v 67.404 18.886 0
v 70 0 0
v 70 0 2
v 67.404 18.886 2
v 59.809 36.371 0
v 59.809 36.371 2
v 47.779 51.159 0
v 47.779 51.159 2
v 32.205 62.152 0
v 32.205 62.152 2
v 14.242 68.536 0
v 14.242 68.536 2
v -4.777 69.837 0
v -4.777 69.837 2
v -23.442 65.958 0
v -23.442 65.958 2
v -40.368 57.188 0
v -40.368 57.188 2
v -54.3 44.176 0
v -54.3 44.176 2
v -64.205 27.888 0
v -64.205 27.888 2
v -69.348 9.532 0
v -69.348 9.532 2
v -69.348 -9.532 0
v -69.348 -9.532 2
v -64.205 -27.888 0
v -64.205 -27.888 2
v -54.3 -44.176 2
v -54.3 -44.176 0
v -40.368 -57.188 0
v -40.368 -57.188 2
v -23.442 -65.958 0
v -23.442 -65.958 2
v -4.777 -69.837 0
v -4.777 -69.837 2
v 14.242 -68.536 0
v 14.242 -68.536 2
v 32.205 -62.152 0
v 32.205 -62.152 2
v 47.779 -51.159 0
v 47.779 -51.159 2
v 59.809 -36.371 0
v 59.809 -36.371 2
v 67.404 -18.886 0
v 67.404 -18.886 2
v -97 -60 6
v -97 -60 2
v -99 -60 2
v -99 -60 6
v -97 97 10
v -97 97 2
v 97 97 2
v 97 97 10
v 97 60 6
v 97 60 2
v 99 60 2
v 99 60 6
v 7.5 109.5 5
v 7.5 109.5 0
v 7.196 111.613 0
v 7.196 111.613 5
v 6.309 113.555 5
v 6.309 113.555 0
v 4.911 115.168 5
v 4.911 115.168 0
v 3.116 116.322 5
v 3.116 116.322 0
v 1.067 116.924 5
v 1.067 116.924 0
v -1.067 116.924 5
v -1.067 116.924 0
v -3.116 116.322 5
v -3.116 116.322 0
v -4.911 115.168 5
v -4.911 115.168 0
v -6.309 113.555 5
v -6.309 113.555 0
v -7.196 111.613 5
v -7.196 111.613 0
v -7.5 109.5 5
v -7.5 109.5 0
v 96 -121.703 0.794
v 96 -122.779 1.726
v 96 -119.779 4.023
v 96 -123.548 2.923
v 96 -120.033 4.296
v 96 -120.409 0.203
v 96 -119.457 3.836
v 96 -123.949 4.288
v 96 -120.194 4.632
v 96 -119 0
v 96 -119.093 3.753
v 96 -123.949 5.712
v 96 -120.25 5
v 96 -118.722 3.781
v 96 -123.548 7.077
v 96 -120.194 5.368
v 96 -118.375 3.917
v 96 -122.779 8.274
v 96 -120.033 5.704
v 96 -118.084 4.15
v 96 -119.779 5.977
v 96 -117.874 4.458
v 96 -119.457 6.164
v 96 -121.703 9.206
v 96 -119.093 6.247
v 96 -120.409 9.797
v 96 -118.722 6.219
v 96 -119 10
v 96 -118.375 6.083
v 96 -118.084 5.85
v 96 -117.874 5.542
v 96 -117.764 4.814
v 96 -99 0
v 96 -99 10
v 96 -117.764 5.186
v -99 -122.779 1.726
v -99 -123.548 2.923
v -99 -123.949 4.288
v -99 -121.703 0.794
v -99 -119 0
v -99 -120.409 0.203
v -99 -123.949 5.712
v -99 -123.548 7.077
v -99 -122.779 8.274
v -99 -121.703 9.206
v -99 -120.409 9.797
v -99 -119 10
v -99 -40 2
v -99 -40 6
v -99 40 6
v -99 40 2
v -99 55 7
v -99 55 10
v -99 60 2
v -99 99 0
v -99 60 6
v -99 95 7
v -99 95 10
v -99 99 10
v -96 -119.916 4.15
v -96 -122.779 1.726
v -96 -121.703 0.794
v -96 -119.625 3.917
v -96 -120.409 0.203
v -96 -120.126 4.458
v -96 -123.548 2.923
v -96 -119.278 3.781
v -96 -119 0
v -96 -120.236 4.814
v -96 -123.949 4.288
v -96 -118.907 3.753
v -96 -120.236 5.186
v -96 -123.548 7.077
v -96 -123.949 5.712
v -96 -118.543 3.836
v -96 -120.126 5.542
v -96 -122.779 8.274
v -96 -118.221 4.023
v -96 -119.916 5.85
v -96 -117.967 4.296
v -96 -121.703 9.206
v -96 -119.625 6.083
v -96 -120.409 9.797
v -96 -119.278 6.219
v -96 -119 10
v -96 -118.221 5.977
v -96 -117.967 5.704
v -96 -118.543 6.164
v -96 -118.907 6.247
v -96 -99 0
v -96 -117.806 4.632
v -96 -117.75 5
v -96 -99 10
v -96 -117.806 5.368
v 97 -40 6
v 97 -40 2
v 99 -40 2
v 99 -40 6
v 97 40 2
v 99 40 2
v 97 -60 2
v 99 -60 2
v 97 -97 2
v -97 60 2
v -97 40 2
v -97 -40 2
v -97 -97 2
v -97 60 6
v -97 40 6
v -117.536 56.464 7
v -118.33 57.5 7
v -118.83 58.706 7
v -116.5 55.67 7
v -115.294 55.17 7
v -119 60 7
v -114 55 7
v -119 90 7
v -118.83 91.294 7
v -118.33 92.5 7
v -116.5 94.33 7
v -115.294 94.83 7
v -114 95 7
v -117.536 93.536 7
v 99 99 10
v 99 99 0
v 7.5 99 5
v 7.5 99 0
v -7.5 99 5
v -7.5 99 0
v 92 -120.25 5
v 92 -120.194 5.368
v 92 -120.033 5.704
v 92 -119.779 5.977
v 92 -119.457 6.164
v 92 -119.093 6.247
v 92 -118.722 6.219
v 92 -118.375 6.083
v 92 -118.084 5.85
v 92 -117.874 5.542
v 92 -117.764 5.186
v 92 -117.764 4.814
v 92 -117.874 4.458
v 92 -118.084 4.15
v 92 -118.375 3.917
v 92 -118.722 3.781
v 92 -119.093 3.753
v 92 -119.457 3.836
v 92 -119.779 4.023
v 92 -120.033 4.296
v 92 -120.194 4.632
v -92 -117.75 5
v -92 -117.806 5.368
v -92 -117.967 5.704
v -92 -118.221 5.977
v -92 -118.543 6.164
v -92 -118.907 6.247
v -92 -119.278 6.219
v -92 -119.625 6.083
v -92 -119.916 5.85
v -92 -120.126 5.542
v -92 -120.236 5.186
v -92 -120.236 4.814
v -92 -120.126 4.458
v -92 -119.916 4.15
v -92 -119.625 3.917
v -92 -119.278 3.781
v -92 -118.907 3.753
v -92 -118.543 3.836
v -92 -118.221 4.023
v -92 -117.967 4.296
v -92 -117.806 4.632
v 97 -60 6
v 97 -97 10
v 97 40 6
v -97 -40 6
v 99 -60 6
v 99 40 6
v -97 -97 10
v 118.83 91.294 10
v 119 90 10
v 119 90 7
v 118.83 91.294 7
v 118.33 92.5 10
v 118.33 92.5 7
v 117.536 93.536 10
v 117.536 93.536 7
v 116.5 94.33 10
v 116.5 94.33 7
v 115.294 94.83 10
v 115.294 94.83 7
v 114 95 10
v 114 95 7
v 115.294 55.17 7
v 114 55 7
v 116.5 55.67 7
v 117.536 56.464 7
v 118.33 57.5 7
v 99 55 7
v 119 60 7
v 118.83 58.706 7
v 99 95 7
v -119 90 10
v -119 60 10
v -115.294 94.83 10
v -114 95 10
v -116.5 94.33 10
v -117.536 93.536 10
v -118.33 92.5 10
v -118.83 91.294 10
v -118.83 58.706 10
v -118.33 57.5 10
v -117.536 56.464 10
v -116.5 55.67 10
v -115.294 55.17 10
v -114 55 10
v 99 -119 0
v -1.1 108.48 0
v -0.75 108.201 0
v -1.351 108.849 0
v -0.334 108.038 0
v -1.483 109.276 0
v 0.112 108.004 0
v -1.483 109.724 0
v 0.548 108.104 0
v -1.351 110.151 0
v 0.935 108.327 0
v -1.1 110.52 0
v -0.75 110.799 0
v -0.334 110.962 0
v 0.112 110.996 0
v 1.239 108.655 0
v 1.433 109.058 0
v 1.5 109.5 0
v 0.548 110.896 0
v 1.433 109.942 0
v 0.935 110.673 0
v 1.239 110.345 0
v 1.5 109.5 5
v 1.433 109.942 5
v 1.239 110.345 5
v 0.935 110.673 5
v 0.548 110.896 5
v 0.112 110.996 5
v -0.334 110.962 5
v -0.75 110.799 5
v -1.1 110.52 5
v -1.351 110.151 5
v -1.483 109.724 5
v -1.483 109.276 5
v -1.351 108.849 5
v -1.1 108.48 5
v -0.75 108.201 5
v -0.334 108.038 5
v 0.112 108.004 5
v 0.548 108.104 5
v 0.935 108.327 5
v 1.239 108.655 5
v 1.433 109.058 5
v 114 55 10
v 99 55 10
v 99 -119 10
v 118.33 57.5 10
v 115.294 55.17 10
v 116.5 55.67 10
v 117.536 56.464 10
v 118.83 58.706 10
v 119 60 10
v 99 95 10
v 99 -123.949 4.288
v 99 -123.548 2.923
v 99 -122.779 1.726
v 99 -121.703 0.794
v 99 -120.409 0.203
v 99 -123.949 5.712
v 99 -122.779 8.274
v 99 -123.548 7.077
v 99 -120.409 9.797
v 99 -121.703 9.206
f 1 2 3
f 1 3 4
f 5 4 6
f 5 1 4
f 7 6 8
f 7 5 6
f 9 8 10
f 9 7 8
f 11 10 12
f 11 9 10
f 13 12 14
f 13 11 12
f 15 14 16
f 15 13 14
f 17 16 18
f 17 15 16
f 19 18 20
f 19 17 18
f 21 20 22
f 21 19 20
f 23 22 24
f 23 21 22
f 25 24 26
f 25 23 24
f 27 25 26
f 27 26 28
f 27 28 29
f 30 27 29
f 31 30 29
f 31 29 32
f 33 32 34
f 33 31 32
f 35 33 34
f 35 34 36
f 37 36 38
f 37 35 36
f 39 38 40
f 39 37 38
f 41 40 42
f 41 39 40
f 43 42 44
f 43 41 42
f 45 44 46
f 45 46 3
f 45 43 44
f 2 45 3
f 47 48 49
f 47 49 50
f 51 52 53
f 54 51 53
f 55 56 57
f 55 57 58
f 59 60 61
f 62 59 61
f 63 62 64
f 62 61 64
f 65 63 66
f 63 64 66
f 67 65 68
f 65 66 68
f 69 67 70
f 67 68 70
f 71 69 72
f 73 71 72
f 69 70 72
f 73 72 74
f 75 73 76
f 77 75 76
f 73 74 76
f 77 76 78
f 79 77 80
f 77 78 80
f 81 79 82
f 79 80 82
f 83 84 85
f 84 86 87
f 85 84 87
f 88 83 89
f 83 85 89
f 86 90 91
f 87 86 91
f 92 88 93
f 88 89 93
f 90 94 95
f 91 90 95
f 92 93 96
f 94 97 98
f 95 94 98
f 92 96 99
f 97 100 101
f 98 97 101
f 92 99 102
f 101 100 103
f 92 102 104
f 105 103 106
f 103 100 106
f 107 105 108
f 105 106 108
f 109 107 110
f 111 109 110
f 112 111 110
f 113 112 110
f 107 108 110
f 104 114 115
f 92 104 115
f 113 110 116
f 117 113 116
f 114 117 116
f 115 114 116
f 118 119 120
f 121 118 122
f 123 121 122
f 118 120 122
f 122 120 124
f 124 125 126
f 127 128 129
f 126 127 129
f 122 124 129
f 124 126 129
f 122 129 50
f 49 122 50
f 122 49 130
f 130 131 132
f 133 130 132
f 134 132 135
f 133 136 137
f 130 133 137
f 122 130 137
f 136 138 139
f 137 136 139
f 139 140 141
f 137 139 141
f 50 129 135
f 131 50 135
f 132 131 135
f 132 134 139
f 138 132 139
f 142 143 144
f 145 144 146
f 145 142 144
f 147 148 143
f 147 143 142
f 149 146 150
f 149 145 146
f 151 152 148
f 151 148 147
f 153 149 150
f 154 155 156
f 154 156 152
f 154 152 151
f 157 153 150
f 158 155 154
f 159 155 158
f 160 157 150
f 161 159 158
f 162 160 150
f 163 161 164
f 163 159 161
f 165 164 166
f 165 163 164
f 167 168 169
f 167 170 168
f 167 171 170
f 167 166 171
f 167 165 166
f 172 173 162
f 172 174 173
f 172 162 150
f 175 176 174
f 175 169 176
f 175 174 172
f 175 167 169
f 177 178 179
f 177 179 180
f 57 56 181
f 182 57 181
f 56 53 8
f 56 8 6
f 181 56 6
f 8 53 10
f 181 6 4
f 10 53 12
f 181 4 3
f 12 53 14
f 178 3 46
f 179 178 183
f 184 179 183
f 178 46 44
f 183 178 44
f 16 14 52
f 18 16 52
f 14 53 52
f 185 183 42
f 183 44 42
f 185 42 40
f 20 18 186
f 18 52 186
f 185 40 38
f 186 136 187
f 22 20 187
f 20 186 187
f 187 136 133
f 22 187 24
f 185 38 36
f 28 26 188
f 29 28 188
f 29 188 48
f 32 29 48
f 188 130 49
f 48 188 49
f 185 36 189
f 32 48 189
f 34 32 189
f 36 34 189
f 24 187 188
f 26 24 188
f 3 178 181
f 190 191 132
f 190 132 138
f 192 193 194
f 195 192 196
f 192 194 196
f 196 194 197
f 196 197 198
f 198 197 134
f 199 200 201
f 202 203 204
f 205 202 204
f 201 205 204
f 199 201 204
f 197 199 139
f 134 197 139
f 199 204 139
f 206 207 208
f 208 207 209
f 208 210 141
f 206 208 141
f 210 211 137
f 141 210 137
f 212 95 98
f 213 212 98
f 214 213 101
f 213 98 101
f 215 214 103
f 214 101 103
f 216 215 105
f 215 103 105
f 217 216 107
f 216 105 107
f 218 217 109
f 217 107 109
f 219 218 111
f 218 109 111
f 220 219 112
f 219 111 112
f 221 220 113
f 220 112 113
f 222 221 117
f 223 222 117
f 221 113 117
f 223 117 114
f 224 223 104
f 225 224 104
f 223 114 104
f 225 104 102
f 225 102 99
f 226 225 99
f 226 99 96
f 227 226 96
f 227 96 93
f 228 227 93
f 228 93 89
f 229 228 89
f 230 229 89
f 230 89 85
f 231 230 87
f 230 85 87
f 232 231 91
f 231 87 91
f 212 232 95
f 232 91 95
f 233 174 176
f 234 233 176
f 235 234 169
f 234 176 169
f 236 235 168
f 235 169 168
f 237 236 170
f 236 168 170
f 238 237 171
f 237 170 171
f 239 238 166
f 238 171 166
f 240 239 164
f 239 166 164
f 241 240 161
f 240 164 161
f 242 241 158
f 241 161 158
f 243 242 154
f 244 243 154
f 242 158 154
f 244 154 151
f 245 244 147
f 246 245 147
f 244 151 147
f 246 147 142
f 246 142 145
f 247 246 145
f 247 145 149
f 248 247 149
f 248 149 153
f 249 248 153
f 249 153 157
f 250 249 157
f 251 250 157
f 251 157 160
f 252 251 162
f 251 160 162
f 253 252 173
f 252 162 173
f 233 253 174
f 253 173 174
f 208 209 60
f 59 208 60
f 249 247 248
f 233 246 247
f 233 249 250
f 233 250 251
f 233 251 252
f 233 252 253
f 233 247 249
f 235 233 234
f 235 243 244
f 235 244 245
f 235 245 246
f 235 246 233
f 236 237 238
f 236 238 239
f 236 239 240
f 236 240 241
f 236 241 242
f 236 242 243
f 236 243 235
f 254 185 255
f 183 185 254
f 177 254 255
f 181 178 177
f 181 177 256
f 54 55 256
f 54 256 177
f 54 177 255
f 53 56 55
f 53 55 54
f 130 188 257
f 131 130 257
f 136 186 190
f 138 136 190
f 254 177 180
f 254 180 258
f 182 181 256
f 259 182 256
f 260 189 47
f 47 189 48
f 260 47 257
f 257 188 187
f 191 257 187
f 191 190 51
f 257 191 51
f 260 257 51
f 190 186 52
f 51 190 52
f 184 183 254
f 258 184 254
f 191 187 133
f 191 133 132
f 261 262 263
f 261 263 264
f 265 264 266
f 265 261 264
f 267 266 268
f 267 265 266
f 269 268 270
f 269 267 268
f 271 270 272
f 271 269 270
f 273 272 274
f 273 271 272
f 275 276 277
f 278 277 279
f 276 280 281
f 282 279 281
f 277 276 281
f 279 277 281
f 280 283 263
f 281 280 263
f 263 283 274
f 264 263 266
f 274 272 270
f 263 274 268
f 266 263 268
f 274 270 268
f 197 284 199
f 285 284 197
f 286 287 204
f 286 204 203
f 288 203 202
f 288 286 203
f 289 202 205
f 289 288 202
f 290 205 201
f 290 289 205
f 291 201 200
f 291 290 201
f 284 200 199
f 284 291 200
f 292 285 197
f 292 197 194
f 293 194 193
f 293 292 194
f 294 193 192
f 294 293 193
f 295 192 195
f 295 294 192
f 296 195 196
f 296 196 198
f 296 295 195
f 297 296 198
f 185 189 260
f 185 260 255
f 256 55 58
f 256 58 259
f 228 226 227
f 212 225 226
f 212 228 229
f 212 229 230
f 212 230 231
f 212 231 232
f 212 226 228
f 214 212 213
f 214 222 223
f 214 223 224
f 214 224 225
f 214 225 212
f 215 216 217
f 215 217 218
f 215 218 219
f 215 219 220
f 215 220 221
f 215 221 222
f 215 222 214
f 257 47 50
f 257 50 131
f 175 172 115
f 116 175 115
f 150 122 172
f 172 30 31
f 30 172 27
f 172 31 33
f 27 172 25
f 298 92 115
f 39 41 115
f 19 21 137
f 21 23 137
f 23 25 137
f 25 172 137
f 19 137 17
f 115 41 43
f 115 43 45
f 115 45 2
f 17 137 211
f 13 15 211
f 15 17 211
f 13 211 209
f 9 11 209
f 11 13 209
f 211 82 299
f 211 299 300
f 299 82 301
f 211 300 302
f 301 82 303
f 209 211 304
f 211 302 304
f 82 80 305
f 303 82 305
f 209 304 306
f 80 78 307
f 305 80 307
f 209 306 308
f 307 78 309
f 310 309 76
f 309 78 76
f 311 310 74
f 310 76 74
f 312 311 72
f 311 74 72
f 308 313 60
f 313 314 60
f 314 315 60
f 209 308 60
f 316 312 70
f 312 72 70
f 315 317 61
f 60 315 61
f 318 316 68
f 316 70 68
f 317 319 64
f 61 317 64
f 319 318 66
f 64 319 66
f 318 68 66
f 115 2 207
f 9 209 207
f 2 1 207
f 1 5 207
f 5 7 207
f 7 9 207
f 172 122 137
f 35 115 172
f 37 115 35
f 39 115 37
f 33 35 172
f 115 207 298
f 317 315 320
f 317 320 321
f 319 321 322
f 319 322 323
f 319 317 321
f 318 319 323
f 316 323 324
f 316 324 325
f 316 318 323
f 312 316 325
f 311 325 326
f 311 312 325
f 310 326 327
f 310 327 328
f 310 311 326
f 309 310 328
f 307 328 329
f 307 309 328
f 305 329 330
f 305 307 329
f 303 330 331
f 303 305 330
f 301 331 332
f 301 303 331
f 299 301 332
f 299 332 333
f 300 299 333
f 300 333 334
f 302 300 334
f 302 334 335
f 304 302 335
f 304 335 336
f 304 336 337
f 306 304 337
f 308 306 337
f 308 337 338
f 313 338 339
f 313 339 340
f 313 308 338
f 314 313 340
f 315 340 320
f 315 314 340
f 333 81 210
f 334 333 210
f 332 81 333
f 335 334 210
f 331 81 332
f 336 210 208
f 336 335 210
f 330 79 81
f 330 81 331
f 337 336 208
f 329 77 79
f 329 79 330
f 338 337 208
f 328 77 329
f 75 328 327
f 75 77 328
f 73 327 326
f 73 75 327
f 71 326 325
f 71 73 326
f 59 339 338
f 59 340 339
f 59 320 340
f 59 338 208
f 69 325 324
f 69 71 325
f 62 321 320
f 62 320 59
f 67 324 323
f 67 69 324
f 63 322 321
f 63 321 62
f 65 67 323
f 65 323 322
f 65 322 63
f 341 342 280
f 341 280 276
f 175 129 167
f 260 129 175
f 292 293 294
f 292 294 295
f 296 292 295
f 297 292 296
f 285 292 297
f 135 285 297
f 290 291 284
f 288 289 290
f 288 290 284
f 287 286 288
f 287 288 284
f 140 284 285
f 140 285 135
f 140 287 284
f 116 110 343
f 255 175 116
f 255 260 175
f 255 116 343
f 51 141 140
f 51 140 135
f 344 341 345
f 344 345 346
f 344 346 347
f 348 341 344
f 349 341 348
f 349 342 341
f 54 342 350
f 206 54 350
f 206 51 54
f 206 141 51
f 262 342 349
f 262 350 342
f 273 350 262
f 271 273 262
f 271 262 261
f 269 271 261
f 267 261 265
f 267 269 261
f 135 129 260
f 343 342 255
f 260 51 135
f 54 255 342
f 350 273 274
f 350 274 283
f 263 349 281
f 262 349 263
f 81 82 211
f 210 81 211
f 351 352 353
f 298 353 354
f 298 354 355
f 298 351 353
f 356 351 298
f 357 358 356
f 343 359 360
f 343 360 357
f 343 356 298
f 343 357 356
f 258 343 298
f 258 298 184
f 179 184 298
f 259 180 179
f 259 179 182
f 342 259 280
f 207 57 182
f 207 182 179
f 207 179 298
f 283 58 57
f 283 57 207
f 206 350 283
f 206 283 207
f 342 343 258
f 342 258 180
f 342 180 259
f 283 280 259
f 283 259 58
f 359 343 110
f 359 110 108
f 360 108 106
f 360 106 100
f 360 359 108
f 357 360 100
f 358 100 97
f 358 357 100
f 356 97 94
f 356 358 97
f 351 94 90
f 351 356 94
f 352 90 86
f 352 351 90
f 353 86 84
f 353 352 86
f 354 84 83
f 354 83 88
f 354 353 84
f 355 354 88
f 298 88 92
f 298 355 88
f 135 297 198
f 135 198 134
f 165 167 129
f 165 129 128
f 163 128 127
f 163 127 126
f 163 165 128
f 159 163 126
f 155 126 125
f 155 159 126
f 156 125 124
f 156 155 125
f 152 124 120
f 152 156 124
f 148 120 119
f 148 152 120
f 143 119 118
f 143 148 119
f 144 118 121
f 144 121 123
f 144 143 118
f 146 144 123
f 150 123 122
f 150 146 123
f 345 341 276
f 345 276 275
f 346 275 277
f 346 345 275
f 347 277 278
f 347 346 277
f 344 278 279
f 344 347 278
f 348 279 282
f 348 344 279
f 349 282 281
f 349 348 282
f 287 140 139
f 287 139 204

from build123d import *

# Parameters (mm, degrees)
F0_W      = 194
F0_H      = 194
F0_R      = 70
F1_DEPTH  = 2
F0_R_2    = 1.5
F2_DEPTH  = 5
F0_W_2    = 3
F0_H_2    = 20
F3_DEPTH  = 10
F5_DEPTH  = 3
F7_DEPTH  = 3
F8_R      = 1.25
F9_DEPTH  = 4
F11_R     = 1.25
F12_DEPTH = 4
F14_DEPTH = 3
F15_W     = 20
F15_H     = 4
F16_DEPTH = 2
F17_W     = 20
F17_H     = 4
F18_DEPTH = 2


with BuildPart() as f1:
    # F0 (on Top) → F1 (new body)
    with BuildSketch(Plane.XY):
        Rectangle(F0_W, F0_H)
        Circle(F0_R, mode=Mode.SUBTRACT)
    extrude(amount=F1_DEPTH)



with BuildPart() as f2:
    # F0 (on Top) → F2 (new body)
    with BuildSketch(Plane.XY):
        with BuildLine():
            Line((-7.5, 99), (7.5, 99))
            Line((7.5, 99), (7.5, 109.5))
            ThreePointArc((7.5, 109.5), (0, 117), (-7.5, 109.5))
            Line((-7.5, 109.5), (-7.5, 99))
        make_face()
        with Locations((0, 109.5)):
            Circle(F0_R_2, mode=Mode.SUBTRACT)
    extrude(amount=F2_DEPTH)


with BuildPart() as f1_1:
    add(f1.part)

    add(f2.part)  # F3 merges F2
    # F0 (on Top) → F3 (join)
    with BuildSketch(Plane.XY):
        Polygon((96, -99), (99, -99), (99, 99), (7.5, 99), (-7.5, 99), (-99, 99), (-99, -99), (-96, -99), align=None)
        Rectangle(F0_W, F0_H, mode=Mode.SUBTRACT)
        with Locations((-97.5, -109)):
            Rectangle(F0_W_2, F0_H_2)
        with Locations((97.5, -109)):
            Rectangle(F0_W_2, F0_H_2)
    extrude(amount=F3_DEPTH)

    # F4 (on face) → F5 (join)
    with BuildSketch(Plane.YZ.offset(-96)):
        with BuildLine():
            Line((-119, 0), (-119, 10))
            ThreePointArc((-119, 10), (-124, 5), (-119, 0))
        make_face()
    extrude(amount=-F5_DEPTH)

    # F6 (on face) → F7 (join)
    with BuildSketch(Plane.YZ.offset(99)):
        with BuildLine():
            Line((-119, 0), (-119, 10))
            ThreePointArc((-119, 10), (-124, 5), (-119, 0))
        make_face()
    extrude(amount=-F7_DEPTH)

    # F8 (on face) → F9 (join)
    with BuildSketch(Plane.YZ.offset(-96)):
        with Locations((-119, 5)):
            Circle(F8_R)
    extrude(amount=F9_DEPTH)

    # F11 (on offset) → F12 (join)
    with BuildSketch(Plane(origin=(96, 0, 0), x_dir=(0, -1, 0), z_dir=(-1, 0, 0))):
        with Locations((119, 5)):
            Circle(F11_R)
    extrude(amount=F12_DEPTH)

    # F13 (on face) → F14 (join)
    with BuildSketch(Plane.XY.offset(10)):
        with BuildLine():
            Line((-99, 55), (-99, 95))
            Line((-99, 95), (-114, 95))
            ThreePointArc((-114, 95), (-117.5355339059, 93.5355339059), (-119, 90))
            Line((-119, 90), (-119, 60))
            ThreePointArc((-119, 60), (-117.5355339059, 56.4644660941), (-114, 55))
            Line((-114, 55), (-99, 55))
        make_face()
        with BuildLine():
            Line((114, 95), (99, 95))
            Line((99, 95), (99, 55))
            Line((99, 55), (114, 55))
            ThreePointArc((114, 55), (117.5355339059, 56.4644660941), (119, 60))
            Line((119, 60), (119, 90))
            ThreePointArc((119, 90), (117.5355339059, 93.5355339059), (114, 95))
        make_face()
    extrude(amount=-F14_DEPTH)

    # F15 (on face) → F16 (cut, through all)
    with BuildSketch(Plane.YZ.offset(-97)):
        with Locations((-50, 4)):
            Rectangle(F15_W, F15_H)
        with Locations((50, 4)):
            Rectangle(F15_W, F15_H)
    extrude(amount=-F16_DEPTH, mode=Mode.SUBTRACT)

    # F17 (on face) → F18 (cut, through all)
    with BuildSketch(Plane(origin=(97, 0, 0), x_dir=(0, -1, 0), z_dir=(-1, 0, 0))):
        with Locations((50, 4)):
            Rectangle(F17_W, F17_H)
        with Locations((-50, 4)):
            Rectangle(F17_W, F17_H)
    extrude(amount=-F18_DEPTH, mode=Mode.SUBTRACT)


solid = f1_1.part
